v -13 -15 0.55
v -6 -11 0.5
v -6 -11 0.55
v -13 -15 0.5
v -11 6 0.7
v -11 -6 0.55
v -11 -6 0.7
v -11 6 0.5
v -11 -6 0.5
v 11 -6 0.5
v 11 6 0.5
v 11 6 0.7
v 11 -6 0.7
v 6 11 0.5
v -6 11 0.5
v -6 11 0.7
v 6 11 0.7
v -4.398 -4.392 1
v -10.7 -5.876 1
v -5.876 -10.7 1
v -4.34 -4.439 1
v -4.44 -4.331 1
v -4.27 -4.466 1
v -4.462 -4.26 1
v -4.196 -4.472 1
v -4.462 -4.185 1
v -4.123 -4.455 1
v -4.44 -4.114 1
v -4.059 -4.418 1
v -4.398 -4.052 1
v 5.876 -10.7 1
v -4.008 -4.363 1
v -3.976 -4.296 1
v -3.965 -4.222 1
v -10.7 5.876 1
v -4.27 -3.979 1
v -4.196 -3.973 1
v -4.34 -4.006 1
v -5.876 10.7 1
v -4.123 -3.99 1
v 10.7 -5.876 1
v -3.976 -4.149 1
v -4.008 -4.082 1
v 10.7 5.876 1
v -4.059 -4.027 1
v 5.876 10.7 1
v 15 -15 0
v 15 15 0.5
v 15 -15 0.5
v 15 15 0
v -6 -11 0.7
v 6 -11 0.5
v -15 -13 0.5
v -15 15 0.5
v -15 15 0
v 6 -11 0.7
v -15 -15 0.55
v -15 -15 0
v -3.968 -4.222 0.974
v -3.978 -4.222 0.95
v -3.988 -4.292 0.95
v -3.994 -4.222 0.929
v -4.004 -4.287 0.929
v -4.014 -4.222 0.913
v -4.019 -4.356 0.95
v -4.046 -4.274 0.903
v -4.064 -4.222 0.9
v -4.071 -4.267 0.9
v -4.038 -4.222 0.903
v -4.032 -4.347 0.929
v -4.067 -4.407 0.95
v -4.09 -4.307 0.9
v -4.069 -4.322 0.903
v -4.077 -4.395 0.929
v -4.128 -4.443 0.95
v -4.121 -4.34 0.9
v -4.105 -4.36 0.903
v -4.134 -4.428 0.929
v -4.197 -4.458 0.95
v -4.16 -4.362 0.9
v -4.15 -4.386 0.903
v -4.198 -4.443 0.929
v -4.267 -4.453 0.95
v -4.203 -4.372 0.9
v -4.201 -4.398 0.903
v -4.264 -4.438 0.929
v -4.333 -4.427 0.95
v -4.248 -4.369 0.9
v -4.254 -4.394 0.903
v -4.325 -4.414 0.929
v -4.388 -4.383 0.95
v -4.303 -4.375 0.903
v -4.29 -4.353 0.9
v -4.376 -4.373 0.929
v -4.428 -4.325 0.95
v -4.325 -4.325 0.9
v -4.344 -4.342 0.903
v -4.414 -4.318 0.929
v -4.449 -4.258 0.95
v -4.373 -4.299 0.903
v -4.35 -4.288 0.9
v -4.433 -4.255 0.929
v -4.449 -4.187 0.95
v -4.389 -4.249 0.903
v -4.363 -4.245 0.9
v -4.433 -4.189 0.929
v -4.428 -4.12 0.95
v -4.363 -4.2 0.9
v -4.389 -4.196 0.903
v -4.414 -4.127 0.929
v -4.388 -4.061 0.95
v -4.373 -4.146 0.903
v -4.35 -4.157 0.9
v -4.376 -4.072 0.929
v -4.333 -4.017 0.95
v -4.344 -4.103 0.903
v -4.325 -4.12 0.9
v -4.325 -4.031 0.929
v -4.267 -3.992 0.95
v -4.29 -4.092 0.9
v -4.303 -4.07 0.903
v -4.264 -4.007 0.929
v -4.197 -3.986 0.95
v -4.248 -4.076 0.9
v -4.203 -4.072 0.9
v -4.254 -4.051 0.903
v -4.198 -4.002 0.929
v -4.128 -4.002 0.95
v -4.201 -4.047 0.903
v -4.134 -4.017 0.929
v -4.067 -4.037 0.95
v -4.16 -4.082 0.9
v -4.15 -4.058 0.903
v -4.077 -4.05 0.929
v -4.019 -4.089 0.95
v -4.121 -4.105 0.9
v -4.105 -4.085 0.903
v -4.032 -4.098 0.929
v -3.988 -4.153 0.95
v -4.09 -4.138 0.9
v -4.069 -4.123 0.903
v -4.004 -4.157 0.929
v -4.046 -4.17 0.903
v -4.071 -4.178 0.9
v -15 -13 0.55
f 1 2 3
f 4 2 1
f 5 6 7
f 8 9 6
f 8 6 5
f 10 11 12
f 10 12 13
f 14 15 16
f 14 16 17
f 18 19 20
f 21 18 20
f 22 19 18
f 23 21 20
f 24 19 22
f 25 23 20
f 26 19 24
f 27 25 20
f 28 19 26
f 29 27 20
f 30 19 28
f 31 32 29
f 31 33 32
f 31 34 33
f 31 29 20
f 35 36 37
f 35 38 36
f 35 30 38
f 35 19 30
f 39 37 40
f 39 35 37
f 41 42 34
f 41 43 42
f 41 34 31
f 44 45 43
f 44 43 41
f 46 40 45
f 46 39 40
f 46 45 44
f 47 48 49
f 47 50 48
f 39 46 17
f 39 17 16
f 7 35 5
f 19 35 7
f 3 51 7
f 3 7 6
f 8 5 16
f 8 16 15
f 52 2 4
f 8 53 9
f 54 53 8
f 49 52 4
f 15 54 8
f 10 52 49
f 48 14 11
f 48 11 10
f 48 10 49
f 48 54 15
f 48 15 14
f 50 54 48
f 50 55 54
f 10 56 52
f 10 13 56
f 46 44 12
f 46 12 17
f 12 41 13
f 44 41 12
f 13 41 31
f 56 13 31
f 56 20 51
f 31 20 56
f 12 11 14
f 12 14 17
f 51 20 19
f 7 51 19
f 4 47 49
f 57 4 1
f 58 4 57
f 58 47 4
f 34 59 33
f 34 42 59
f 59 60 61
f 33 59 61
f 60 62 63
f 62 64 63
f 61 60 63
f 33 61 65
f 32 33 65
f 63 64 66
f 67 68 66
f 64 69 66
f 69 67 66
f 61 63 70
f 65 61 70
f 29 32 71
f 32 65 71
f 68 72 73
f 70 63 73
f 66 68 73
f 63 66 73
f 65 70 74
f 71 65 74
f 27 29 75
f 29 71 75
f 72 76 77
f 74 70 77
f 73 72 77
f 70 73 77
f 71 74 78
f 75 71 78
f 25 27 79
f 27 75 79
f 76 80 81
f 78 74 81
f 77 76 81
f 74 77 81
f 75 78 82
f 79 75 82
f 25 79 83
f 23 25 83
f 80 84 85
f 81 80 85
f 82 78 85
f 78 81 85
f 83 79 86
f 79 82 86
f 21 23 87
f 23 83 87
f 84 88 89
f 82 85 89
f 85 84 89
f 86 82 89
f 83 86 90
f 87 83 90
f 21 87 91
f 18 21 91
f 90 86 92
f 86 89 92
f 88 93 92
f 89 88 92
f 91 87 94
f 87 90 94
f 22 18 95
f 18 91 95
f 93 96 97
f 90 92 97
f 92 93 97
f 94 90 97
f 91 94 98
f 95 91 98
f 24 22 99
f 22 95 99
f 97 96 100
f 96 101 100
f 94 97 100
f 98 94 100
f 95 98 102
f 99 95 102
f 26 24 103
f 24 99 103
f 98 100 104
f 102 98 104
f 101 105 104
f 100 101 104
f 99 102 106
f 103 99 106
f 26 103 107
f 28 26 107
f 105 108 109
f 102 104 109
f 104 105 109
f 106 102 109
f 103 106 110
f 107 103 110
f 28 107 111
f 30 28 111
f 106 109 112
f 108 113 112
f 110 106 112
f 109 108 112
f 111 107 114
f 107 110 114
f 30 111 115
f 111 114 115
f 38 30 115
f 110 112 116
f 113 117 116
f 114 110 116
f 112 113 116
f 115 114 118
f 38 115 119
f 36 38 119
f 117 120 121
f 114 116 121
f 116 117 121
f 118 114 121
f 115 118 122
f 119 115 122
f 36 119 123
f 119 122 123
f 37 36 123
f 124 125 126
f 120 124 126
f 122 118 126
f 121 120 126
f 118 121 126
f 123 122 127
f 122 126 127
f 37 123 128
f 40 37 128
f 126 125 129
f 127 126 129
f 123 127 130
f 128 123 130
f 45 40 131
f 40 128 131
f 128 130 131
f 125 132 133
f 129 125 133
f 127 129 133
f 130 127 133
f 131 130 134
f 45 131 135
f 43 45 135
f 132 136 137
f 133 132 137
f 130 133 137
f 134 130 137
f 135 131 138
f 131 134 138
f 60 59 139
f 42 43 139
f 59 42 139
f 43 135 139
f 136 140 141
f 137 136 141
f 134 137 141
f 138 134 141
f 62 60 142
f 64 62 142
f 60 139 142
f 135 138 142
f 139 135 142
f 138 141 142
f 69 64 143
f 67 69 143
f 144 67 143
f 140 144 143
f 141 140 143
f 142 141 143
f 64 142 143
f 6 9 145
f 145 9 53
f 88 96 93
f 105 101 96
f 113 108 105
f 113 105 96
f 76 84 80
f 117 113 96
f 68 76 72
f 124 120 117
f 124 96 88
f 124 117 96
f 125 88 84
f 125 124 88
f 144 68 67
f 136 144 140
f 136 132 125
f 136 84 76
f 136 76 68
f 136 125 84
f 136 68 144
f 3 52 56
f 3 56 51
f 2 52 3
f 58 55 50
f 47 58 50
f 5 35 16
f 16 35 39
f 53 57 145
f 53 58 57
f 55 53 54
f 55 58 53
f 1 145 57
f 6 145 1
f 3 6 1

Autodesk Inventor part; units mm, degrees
ref_plane "YZ Plane" through (0, 0, 0) normal (1, 0, 0) x (0, 1, 0)
ref_plane "XZ Plane" through (0, 0, 0) normal (0, 1, 0) x (-1, 0, 0)
ref_plane "XY Plane" through (0, 0, 0) normal (0, 0, 1) x (1, 0, 0)
sketch "Sketch1" plane through (0, 0, 0) normal (0, 0, 1) x (1, 0, 0)
  line L0 (0, 24) -> (0, -18) projected
  line L1 (-18, 0) -> (24, 0) projected
  line L2 (-15, 15) -> (15, 15)
  line L3 (15, 15) -> (15, -15)
  line L4 (15, -15) -> (-15, -15)
  line L5 (-15, -15) -> (-15, 15)
  dimension "d0" = 30
extrude "Extrusion1" add sketch "Sketch1" along normal blind 0.5
sketch "Sketch2" plane through (0, 0, 0.5) normal (0, 0, 1) x (1, 0, 0)
  line L0 (0, 24) -> (0, -18) projected
  line L1 (-18, 0) -> (24, 0) projected
  line L2 (-11, 11) -> (11, 11)
  line L3 (11, 11) -> (11, -11)
  line L4 (11, -11) -> (-11, -11)
  line L5 (-11, -11) -> (-11, 11)
  dimension "d3" = 22
extrude "Extrusion2" add sketch "Sketch2" along normal blind 0.5
chamfer "Chamfer1" distance 5 angle 45 4 edges at (-11, -11, 0.75) (11, -11, 0.75) (11, 11, 0.75) (-11, 11, 0.75)
chamfer "Chamfer2" distance 0.3 angle 45 8 edges at (-11, 0, 1) (-8.5, -8.5, 1) (0, -11, 1) (8.5, -8.5, 1) (11, 0, 1) (8.5, 8.5, 1) (0, 11, 1) (-8.5, 8.5, 1)
sketch "Sketch3" plane through (0, 0, 0.5) normal (0, 0, 1) x (1, 0, 0)
  line L0 (-11, -6) -> (-6, -11) projected
  line L1 (-15, -15) -> (-15, 15) projected
  line L2 (15, -15) -> (-15, -15) projected
  line L3 (-11, -6) -> (-15, -13)
  line L4 (-6, -11) -> (-13, -15)
  dimension "d12" = 2
  dimension "d13" = 2
extrude "Extrusion3" add sketch "Sketch3" along normal blind 0.05
sketch "Sketch4" plane through (0, 0, 1) normal (0, 0, 1) x (1, 0, 0)
  circle A0 centre (-4.2146, -4.2224) radius 0.25
  dimension "d16" = 0.5
extrude "Extrusion4" cut sketch "Sketch4" against normal blind 0.1
fillet "Fillet1" radius 0.1 1 edges at (-4.4646, -4.2224, 0.9)
equation "\"d13\" = d12"
properties part number "config - chip 15 x15"
